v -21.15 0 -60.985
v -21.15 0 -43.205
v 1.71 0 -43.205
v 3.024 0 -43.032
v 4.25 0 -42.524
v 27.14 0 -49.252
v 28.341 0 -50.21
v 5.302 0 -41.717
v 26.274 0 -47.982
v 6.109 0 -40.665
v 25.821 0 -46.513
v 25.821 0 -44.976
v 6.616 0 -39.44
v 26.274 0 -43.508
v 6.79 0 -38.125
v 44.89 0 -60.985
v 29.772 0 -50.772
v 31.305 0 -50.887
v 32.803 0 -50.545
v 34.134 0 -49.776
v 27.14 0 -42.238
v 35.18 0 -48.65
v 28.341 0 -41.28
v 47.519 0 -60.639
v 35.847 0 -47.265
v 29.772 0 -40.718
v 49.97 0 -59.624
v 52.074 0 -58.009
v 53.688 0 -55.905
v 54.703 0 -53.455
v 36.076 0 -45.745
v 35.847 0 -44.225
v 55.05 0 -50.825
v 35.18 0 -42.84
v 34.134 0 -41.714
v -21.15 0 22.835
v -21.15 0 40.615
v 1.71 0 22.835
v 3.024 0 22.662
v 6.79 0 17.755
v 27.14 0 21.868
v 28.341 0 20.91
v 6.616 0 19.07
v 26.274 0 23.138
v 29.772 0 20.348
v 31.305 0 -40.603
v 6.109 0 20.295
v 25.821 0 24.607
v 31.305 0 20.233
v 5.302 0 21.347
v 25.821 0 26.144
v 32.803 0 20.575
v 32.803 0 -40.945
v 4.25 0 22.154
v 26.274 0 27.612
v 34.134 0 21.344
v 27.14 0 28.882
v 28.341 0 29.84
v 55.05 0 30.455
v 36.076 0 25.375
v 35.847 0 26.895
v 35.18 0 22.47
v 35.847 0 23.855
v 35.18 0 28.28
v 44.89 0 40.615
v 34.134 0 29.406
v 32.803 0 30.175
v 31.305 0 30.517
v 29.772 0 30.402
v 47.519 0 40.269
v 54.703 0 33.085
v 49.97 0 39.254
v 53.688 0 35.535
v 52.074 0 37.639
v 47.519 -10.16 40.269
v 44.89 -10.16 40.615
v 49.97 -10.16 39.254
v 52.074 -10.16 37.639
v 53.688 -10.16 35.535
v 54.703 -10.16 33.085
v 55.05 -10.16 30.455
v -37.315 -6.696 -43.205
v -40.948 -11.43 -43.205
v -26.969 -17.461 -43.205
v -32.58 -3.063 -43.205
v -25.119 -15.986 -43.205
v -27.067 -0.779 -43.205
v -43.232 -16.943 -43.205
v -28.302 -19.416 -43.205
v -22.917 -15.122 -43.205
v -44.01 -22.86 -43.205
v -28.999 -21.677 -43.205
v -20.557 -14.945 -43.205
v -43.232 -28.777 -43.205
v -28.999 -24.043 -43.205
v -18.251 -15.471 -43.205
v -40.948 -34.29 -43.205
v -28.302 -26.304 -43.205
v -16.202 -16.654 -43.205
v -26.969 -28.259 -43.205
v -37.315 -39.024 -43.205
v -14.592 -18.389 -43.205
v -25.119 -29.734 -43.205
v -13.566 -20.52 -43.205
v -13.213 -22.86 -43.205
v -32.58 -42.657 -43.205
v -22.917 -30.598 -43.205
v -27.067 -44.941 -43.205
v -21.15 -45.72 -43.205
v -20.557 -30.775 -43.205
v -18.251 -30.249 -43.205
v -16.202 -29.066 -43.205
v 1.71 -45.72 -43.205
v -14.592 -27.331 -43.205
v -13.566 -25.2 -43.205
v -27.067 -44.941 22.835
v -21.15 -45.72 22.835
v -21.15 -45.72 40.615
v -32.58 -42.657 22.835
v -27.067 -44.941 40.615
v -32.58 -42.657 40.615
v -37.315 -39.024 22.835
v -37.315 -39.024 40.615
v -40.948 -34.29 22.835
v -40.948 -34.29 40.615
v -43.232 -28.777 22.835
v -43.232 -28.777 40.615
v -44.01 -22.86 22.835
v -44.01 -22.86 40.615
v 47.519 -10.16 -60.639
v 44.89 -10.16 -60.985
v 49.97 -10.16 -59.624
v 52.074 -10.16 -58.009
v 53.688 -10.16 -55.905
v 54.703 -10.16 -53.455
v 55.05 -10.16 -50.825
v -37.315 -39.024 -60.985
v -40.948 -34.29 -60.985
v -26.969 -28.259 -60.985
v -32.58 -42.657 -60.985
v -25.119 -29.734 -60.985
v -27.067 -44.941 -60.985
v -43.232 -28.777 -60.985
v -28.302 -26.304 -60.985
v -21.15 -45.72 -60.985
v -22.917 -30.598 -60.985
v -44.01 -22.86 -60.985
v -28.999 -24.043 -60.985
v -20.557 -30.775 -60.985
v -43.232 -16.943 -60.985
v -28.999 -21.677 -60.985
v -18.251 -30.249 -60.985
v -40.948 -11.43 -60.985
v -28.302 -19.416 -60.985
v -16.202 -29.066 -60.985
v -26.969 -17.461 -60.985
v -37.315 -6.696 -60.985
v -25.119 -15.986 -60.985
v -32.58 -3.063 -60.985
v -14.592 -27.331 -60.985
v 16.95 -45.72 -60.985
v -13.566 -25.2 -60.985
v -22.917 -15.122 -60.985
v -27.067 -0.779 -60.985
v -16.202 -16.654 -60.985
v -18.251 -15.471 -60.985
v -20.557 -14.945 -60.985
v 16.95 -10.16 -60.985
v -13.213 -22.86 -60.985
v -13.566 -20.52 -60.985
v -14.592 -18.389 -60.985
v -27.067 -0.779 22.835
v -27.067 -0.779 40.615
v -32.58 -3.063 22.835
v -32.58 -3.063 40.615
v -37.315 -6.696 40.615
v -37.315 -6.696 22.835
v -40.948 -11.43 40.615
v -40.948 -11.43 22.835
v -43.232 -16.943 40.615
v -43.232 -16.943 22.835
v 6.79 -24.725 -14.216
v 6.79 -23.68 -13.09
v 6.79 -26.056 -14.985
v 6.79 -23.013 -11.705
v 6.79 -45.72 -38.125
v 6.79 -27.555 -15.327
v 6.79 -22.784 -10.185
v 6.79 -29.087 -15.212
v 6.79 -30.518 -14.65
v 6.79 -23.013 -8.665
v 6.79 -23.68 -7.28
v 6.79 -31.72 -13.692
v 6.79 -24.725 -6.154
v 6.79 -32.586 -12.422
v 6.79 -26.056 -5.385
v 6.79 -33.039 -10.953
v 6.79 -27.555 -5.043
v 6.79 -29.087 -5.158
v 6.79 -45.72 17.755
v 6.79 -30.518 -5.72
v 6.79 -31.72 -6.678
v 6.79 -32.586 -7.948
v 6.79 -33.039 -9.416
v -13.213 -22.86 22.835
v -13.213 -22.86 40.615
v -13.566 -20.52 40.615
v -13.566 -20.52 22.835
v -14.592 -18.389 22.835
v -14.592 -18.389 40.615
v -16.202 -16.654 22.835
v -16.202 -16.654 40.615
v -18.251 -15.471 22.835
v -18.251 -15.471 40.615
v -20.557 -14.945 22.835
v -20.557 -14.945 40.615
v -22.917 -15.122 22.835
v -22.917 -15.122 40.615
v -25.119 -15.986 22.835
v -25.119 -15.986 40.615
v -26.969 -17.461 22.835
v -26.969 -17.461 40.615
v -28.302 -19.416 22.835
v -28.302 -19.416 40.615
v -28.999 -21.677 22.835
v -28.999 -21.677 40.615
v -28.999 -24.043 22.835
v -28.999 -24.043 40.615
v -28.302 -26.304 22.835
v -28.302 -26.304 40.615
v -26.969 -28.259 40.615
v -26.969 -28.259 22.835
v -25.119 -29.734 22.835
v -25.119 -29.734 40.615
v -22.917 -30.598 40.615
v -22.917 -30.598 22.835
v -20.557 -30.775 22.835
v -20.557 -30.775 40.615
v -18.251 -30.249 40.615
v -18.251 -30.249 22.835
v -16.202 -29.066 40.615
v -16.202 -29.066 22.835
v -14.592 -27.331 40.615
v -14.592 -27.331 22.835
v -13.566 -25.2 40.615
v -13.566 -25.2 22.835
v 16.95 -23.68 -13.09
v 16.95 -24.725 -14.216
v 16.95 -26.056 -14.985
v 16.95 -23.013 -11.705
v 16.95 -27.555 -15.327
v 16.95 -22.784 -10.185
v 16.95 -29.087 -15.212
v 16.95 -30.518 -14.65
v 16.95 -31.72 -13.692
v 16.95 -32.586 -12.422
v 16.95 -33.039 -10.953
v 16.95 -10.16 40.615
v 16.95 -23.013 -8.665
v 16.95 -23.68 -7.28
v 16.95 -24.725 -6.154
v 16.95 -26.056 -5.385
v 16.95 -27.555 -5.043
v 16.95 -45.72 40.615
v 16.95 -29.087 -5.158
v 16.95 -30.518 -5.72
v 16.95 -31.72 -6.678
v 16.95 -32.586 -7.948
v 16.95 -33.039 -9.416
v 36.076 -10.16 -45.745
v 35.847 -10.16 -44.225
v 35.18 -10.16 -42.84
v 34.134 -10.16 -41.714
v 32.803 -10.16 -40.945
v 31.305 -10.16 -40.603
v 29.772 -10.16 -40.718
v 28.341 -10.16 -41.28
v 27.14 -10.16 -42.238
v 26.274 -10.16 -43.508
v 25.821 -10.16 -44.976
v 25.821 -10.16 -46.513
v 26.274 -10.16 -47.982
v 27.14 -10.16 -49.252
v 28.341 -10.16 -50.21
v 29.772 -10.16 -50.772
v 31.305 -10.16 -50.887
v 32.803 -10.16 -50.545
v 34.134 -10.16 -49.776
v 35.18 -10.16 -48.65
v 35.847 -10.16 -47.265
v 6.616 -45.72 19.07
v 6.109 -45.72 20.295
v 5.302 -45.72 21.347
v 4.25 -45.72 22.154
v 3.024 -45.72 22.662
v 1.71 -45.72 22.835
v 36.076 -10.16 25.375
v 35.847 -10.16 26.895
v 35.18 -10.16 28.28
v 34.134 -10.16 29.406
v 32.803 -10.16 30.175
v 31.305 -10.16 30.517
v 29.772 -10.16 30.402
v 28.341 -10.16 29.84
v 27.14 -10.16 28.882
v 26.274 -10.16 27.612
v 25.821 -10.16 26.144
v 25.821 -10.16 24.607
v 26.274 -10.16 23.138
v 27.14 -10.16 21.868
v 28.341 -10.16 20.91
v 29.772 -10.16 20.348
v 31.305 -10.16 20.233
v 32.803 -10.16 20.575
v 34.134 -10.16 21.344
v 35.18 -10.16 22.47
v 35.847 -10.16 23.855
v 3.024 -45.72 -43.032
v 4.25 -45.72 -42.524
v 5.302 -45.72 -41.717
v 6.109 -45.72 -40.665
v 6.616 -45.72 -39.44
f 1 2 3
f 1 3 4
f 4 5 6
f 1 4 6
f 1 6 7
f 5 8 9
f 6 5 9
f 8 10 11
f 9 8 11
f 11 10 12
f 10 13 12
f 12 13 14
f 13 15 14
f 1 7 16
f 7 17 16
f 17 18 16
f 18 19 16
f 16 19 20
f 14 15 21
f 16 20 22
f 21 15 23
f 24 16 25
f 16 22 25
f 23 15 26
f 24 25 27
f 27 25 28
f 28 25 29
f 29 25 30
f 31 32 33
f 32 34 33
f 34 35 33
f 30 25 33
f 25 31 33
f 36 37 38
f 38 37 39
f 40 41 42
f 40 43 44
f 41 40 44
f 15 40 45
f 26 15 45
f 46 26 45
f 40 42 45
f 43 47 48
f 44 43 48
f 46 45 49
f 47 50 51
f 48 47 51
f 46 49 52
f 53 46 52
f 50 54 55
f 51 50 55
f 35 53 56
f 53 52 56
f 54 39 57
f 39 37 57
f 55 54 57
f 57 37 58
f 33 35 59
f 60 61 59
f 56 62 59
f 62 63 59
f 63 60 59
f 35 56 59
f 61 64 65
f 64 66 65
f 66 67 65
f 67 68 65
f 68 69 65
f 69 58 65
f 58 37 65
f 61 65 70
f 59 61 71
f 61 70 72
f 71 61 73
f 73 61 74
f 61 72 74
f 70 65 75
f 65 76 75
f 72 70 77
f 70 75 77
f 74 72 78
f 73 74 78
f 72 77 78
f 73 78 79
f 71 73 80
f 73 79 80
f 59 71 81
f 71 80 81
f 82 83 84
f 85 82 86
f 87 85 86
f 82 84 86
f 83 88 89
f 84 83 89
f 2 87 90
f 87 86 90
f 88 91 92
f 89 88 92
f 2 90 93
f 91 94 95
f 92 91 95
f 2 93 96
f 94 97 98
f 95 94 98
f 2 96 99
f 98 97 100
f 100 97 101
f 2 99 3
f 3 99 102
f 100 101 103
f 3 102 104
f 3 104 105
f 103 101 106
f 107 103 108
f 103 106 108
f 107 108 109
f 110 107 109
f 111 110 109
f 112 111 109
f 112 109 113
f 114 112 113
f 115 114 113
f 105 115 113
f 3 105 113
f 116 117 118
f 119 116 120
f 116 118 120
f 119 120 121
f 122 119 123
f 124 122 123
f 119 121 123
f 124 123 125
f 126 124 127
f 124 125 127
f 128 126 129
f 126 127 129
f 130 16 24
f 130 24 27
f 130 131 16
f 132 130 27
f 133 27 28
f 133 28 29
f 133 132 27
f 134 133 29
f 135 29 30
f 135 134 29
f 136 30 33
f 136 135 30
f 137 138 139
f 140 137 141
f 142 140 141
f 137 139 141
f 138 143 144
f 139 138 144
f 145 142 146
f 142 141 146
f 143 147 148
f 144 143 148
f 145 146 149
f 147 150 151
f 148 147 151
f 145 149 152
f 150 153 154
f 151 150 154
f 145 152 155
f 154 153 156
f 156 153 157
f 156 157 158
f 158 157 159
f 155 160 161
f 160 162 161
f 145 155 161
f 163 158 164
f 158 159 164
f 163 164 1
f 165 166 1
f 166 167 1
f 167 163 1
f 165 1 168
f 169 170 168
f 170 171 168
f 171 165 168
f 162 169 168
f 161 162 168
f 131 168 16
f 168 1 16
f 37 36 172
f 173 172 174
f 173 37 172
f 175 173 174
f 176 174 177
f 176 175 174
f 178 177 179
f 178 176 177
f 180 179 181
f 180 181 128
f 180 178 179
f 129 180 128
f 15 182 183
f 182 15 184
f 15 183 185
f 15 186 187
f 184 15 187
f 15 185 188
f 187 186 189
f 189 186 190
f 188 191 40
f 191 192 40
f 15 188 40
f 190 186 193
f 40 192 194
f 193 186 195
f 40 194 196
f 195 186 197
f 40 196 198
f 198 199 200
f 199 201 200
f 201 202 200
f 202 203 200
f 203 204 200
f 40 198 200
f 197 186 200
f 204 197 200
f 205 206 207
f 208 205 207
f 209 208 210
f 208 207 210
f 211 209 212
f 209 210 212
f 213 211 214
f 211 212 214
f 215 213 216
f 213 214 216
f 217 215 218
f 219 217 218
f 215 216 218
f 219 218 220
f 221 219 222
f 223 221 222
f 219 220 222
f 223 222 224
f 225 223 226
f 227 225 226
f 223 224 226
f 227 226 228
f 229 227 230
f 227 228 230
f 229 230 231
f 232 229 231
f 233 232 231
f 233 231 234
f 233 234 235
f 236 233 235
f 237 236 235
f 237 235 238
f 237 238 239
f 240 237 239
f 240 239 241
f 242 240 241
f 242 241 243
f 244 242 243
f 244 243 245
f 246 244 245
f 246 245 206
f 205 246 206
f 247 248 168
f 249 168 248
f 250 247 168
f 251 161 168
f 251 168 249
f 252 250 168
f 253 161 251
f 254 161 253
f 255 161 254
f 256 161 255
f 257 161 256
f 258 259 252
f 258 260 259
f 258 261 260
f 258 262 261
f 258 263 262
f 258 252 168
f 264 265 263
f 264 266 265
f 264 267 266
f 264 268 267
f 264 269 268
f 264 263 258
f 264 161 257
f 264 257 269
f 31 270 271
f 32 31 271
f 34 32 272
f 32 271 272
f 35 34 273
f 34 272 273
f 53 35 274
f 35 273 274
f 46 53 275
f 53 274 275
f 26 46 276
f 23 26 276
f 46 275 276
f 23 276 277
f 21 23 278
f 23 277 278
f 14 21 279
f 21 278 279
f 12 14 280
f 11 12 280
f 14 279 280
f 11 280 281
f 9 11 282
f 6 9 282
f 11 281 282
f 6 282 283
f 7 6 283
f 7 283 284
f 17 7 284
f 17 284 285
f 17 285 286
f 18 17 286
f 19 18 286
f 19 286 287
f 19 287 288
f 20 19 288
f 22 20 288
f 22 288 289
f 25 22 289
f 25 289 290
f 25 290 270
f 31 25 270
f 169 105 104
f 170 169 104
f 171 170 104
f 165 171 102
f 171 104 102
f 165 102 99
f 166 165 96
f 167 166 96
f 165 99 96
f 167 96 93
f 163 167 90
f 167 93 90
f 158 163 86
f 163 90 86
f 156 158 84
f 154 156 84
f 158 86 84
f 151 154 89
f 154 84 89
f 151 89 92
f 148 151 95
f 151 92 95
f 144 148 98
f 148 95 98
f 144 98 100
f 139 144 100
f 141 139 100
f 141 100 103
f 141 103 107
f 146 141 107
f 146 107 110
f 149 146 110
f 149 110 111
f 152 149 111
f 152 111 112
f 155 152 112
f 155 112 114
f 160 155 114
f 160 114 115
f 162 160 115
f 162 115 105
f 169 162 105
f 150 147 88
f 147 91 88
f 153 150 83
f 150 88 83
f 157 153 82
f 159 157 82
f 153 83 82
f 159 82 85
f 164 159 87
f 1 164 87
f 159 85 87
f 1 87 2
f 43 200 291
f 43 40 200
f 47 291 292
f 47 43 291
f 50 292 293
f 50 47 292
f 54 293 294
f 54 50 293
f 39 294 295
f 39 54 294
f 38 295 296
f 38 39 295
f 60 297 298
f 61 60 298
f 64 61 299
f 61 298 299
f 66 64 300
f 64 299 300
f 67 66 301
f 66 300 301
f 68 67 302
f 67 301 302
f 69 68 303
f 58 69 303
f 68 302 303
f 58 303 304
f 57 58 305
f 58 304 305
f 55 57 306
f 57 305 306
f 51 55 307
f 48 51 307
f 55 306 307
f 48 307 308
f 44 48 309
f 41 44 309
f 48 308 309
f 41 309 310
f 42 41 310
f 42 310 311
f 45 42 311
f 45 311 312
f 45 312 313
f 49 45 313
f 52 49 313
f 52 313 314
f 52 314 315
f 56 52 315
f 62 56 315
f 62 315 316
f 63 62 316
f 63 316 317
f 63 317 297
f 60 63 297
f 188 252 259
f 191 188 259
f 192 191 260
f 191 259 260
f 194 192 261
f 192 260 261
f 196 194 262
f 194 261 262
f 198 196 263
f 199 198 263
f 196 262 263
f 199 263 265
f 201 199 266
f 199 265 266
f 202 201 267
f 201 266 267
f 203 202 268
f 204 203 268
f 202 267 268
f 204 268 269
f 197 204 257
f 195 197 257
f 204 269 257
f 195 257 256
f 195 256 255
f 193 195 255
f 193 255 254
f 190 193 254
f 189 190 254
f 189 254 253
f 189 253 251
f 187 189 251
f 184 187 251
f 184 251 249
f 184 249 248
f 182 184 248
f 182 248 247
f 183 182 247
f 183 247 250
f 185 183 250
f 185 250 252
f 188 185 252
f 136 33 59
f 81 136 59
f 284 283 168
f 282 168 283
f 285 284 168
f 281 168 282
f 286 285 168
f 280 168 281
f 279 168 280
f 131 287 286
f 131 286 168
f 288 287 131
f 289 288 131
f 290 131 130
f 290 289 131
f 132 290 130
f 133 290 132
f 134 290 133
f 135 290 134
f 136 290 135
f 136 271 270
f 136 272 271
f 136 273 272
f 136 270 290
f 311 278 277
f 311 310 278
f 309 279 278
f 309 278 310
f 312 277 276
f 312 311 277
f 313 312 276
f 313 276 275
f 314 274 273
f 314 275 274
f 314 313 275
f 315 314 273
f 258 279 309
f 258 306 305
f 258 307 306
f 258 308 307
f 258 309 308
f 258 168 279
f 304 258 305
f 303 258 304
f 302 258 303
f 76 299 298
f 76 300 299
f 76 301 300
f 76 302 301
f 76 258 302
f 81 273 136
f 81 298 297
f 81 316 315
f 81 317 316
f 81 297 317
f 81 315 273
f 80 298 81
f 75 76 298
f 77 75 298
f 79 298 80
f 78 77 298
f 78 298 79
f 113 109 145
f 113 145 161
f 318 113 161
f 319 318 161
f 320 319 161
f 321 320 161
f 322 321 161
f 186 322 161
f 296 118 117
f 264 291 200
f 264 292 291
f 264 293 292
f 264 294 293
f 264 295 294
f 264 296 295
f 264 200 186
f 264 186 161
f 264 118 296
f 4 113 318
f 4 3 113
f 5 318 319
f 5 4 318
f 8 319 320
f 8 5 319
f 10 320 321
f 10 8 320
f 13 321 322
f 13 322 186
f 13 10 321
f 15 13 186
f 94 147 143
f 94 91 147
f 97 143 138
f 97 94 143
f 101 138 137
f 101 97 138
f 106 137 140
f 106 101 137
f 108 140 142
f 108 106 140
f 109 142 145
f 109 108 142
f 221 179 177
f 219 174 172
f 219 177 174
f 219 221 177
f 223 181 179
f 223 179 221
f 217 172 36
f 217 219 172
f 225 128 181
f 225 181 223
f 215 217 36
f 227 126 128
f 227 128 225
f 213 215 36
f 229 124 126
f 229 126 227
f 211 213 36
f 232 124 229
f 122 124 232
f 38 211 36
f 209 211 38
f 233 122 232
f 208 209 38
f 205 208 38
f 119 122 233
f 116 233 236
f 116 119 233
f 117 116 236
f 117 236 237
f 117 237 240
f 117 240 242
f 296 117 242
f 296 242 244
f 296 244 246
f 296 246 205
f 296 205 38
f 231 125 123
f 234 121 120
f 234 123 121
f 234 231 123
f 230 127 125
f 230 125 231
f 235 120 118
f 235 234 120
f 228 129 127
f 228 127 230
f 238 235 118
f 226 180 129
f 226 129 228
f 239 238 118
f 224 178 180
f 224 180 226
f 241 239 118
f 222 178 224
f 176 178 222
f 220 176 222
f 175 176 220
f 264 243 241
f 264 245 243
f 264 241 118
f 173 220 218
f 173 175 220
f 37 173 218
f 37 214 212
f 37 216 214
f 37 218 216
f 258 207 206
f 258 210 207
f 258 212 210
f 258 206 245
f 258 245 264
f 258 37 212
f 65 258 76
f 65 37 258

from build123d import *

# Parameters (mm, degrees)
F0_W      = 99.06
F0_H      = 101.6
F1_DEPTH  = 45.72
F2_W      = 45.8418870593
F2_H      = 107.1278404426
F3_DEPTH  = 35.56
F4_W      = 96.4650140689
F4_H      = 66.04
F5_DEPTH  = 45.721
F6_R      = 22.85999
F7_R      = 7.9375
F8_DEPTH  = 101.601
F9_R      = 5.08
F10_R     = 10.16
F11_R     = 5.1562
F12_DEPTH = 60.961
F13_R     = 5.1562
F14_DEPTH = 10.161


# Not quite as in the source:
# - a fillet or chamfer is up to 0.001 mm smaller than in the source, because OpenCascade refuses the exact size


with BuildPart() as f1:
    # F0 (on Front) → F1 (new body)
    with BuildSketch(Plane.XZ):
        with Locations((5.5195279419, -10.1849297343)):
            Rectangle(F0_W, F0_H)
    extrude(amount=F1_DEPTH)

    # F2 (on face) → F3 (cut)
    with BuildSketch(Plane.XZ.offset(45.72)):
        with Locations((39.8704714716, -9.8085980862)):
            Rectangle(F2_W, F2_H)
    extrude(amount=-F3_DEPTH, mode=Mode.SUBTRACT)

    # F4 (on face) → F5 (cut, through all)
    with BuildSketch(Plane.XZ.offset(45.72)):
        with Locations((-41.4429790925, -10.1849297343)):
            Rectangle(F4_W, F4_H)
    extrude(amount=-F5_DEPTH, mode=Mode.SUBTRACT)

    # F6 (radius 22.86 in the source; OpenCascade refuses exactly that, so slightly less here)
    f6_edges = [f1.edges().sort_by_distance(p)[0] for p in [
        (-44.010472, 0, 31.72507),
        (-44.010472, -45.72, 31.72507),
        (-44.010472, 0, -52.09493),
        (-44.010472, -45.72, -52.09493),
    ]]
    fillet(f6_edges, radius=F6_R)

    # F7 (on face) → F8 (cut, through all)
    with BuildSketch(Plane.XY.offset(40.6150702657)):
        with Locations((-21.1504720581, -22.86)):
            Circle(F7_R)
    extrude(amount=-F8_DEPTH, mode=Mode.SUBTRACT)

    # F9
    f9_edges = [f1.edges().sort_by_distance(p)[0] for p in [
        (6.789528, -22.86, 22.83507),
        (6.789528, -22.86, -43.20493),
    ]]
    fillet(f9_edges, radius=F9_R)

    # F10
    f10_edges = [f1.edges().sort_by_distance(p)[0] for p in [
        (55.049528, -5.08, 40.61507),
        (55.049528, -5.08, -60.98493),
    ]]
    fillet(f10_edges, radius=F10_R)

    # F11 (on face) → F12 (cut, through all)
    with BuildSketch(Plane.YZ.offset(16.9495279419)):
        with Locations((-27.94, -10.1849297343)):
            Circle(F11_R)
    extrude(amount=-F12_DEPTH, mode=Mode.SUBTRACT)

    # F13 (on face) → F14 (cut, through all)
    with BuildSketch(Plane.XZ.offset(10.16)):
        with Locations((30.9195279419, 25.3750702657)):
            Circle(F13_R)
        with Locations((30.9195279419, -45.7449297343)):
            Circle(F13_R)
    extrude(amount=-F14_DEPTH, mode=Mode.SUBTRACT)


solid = f1.part
